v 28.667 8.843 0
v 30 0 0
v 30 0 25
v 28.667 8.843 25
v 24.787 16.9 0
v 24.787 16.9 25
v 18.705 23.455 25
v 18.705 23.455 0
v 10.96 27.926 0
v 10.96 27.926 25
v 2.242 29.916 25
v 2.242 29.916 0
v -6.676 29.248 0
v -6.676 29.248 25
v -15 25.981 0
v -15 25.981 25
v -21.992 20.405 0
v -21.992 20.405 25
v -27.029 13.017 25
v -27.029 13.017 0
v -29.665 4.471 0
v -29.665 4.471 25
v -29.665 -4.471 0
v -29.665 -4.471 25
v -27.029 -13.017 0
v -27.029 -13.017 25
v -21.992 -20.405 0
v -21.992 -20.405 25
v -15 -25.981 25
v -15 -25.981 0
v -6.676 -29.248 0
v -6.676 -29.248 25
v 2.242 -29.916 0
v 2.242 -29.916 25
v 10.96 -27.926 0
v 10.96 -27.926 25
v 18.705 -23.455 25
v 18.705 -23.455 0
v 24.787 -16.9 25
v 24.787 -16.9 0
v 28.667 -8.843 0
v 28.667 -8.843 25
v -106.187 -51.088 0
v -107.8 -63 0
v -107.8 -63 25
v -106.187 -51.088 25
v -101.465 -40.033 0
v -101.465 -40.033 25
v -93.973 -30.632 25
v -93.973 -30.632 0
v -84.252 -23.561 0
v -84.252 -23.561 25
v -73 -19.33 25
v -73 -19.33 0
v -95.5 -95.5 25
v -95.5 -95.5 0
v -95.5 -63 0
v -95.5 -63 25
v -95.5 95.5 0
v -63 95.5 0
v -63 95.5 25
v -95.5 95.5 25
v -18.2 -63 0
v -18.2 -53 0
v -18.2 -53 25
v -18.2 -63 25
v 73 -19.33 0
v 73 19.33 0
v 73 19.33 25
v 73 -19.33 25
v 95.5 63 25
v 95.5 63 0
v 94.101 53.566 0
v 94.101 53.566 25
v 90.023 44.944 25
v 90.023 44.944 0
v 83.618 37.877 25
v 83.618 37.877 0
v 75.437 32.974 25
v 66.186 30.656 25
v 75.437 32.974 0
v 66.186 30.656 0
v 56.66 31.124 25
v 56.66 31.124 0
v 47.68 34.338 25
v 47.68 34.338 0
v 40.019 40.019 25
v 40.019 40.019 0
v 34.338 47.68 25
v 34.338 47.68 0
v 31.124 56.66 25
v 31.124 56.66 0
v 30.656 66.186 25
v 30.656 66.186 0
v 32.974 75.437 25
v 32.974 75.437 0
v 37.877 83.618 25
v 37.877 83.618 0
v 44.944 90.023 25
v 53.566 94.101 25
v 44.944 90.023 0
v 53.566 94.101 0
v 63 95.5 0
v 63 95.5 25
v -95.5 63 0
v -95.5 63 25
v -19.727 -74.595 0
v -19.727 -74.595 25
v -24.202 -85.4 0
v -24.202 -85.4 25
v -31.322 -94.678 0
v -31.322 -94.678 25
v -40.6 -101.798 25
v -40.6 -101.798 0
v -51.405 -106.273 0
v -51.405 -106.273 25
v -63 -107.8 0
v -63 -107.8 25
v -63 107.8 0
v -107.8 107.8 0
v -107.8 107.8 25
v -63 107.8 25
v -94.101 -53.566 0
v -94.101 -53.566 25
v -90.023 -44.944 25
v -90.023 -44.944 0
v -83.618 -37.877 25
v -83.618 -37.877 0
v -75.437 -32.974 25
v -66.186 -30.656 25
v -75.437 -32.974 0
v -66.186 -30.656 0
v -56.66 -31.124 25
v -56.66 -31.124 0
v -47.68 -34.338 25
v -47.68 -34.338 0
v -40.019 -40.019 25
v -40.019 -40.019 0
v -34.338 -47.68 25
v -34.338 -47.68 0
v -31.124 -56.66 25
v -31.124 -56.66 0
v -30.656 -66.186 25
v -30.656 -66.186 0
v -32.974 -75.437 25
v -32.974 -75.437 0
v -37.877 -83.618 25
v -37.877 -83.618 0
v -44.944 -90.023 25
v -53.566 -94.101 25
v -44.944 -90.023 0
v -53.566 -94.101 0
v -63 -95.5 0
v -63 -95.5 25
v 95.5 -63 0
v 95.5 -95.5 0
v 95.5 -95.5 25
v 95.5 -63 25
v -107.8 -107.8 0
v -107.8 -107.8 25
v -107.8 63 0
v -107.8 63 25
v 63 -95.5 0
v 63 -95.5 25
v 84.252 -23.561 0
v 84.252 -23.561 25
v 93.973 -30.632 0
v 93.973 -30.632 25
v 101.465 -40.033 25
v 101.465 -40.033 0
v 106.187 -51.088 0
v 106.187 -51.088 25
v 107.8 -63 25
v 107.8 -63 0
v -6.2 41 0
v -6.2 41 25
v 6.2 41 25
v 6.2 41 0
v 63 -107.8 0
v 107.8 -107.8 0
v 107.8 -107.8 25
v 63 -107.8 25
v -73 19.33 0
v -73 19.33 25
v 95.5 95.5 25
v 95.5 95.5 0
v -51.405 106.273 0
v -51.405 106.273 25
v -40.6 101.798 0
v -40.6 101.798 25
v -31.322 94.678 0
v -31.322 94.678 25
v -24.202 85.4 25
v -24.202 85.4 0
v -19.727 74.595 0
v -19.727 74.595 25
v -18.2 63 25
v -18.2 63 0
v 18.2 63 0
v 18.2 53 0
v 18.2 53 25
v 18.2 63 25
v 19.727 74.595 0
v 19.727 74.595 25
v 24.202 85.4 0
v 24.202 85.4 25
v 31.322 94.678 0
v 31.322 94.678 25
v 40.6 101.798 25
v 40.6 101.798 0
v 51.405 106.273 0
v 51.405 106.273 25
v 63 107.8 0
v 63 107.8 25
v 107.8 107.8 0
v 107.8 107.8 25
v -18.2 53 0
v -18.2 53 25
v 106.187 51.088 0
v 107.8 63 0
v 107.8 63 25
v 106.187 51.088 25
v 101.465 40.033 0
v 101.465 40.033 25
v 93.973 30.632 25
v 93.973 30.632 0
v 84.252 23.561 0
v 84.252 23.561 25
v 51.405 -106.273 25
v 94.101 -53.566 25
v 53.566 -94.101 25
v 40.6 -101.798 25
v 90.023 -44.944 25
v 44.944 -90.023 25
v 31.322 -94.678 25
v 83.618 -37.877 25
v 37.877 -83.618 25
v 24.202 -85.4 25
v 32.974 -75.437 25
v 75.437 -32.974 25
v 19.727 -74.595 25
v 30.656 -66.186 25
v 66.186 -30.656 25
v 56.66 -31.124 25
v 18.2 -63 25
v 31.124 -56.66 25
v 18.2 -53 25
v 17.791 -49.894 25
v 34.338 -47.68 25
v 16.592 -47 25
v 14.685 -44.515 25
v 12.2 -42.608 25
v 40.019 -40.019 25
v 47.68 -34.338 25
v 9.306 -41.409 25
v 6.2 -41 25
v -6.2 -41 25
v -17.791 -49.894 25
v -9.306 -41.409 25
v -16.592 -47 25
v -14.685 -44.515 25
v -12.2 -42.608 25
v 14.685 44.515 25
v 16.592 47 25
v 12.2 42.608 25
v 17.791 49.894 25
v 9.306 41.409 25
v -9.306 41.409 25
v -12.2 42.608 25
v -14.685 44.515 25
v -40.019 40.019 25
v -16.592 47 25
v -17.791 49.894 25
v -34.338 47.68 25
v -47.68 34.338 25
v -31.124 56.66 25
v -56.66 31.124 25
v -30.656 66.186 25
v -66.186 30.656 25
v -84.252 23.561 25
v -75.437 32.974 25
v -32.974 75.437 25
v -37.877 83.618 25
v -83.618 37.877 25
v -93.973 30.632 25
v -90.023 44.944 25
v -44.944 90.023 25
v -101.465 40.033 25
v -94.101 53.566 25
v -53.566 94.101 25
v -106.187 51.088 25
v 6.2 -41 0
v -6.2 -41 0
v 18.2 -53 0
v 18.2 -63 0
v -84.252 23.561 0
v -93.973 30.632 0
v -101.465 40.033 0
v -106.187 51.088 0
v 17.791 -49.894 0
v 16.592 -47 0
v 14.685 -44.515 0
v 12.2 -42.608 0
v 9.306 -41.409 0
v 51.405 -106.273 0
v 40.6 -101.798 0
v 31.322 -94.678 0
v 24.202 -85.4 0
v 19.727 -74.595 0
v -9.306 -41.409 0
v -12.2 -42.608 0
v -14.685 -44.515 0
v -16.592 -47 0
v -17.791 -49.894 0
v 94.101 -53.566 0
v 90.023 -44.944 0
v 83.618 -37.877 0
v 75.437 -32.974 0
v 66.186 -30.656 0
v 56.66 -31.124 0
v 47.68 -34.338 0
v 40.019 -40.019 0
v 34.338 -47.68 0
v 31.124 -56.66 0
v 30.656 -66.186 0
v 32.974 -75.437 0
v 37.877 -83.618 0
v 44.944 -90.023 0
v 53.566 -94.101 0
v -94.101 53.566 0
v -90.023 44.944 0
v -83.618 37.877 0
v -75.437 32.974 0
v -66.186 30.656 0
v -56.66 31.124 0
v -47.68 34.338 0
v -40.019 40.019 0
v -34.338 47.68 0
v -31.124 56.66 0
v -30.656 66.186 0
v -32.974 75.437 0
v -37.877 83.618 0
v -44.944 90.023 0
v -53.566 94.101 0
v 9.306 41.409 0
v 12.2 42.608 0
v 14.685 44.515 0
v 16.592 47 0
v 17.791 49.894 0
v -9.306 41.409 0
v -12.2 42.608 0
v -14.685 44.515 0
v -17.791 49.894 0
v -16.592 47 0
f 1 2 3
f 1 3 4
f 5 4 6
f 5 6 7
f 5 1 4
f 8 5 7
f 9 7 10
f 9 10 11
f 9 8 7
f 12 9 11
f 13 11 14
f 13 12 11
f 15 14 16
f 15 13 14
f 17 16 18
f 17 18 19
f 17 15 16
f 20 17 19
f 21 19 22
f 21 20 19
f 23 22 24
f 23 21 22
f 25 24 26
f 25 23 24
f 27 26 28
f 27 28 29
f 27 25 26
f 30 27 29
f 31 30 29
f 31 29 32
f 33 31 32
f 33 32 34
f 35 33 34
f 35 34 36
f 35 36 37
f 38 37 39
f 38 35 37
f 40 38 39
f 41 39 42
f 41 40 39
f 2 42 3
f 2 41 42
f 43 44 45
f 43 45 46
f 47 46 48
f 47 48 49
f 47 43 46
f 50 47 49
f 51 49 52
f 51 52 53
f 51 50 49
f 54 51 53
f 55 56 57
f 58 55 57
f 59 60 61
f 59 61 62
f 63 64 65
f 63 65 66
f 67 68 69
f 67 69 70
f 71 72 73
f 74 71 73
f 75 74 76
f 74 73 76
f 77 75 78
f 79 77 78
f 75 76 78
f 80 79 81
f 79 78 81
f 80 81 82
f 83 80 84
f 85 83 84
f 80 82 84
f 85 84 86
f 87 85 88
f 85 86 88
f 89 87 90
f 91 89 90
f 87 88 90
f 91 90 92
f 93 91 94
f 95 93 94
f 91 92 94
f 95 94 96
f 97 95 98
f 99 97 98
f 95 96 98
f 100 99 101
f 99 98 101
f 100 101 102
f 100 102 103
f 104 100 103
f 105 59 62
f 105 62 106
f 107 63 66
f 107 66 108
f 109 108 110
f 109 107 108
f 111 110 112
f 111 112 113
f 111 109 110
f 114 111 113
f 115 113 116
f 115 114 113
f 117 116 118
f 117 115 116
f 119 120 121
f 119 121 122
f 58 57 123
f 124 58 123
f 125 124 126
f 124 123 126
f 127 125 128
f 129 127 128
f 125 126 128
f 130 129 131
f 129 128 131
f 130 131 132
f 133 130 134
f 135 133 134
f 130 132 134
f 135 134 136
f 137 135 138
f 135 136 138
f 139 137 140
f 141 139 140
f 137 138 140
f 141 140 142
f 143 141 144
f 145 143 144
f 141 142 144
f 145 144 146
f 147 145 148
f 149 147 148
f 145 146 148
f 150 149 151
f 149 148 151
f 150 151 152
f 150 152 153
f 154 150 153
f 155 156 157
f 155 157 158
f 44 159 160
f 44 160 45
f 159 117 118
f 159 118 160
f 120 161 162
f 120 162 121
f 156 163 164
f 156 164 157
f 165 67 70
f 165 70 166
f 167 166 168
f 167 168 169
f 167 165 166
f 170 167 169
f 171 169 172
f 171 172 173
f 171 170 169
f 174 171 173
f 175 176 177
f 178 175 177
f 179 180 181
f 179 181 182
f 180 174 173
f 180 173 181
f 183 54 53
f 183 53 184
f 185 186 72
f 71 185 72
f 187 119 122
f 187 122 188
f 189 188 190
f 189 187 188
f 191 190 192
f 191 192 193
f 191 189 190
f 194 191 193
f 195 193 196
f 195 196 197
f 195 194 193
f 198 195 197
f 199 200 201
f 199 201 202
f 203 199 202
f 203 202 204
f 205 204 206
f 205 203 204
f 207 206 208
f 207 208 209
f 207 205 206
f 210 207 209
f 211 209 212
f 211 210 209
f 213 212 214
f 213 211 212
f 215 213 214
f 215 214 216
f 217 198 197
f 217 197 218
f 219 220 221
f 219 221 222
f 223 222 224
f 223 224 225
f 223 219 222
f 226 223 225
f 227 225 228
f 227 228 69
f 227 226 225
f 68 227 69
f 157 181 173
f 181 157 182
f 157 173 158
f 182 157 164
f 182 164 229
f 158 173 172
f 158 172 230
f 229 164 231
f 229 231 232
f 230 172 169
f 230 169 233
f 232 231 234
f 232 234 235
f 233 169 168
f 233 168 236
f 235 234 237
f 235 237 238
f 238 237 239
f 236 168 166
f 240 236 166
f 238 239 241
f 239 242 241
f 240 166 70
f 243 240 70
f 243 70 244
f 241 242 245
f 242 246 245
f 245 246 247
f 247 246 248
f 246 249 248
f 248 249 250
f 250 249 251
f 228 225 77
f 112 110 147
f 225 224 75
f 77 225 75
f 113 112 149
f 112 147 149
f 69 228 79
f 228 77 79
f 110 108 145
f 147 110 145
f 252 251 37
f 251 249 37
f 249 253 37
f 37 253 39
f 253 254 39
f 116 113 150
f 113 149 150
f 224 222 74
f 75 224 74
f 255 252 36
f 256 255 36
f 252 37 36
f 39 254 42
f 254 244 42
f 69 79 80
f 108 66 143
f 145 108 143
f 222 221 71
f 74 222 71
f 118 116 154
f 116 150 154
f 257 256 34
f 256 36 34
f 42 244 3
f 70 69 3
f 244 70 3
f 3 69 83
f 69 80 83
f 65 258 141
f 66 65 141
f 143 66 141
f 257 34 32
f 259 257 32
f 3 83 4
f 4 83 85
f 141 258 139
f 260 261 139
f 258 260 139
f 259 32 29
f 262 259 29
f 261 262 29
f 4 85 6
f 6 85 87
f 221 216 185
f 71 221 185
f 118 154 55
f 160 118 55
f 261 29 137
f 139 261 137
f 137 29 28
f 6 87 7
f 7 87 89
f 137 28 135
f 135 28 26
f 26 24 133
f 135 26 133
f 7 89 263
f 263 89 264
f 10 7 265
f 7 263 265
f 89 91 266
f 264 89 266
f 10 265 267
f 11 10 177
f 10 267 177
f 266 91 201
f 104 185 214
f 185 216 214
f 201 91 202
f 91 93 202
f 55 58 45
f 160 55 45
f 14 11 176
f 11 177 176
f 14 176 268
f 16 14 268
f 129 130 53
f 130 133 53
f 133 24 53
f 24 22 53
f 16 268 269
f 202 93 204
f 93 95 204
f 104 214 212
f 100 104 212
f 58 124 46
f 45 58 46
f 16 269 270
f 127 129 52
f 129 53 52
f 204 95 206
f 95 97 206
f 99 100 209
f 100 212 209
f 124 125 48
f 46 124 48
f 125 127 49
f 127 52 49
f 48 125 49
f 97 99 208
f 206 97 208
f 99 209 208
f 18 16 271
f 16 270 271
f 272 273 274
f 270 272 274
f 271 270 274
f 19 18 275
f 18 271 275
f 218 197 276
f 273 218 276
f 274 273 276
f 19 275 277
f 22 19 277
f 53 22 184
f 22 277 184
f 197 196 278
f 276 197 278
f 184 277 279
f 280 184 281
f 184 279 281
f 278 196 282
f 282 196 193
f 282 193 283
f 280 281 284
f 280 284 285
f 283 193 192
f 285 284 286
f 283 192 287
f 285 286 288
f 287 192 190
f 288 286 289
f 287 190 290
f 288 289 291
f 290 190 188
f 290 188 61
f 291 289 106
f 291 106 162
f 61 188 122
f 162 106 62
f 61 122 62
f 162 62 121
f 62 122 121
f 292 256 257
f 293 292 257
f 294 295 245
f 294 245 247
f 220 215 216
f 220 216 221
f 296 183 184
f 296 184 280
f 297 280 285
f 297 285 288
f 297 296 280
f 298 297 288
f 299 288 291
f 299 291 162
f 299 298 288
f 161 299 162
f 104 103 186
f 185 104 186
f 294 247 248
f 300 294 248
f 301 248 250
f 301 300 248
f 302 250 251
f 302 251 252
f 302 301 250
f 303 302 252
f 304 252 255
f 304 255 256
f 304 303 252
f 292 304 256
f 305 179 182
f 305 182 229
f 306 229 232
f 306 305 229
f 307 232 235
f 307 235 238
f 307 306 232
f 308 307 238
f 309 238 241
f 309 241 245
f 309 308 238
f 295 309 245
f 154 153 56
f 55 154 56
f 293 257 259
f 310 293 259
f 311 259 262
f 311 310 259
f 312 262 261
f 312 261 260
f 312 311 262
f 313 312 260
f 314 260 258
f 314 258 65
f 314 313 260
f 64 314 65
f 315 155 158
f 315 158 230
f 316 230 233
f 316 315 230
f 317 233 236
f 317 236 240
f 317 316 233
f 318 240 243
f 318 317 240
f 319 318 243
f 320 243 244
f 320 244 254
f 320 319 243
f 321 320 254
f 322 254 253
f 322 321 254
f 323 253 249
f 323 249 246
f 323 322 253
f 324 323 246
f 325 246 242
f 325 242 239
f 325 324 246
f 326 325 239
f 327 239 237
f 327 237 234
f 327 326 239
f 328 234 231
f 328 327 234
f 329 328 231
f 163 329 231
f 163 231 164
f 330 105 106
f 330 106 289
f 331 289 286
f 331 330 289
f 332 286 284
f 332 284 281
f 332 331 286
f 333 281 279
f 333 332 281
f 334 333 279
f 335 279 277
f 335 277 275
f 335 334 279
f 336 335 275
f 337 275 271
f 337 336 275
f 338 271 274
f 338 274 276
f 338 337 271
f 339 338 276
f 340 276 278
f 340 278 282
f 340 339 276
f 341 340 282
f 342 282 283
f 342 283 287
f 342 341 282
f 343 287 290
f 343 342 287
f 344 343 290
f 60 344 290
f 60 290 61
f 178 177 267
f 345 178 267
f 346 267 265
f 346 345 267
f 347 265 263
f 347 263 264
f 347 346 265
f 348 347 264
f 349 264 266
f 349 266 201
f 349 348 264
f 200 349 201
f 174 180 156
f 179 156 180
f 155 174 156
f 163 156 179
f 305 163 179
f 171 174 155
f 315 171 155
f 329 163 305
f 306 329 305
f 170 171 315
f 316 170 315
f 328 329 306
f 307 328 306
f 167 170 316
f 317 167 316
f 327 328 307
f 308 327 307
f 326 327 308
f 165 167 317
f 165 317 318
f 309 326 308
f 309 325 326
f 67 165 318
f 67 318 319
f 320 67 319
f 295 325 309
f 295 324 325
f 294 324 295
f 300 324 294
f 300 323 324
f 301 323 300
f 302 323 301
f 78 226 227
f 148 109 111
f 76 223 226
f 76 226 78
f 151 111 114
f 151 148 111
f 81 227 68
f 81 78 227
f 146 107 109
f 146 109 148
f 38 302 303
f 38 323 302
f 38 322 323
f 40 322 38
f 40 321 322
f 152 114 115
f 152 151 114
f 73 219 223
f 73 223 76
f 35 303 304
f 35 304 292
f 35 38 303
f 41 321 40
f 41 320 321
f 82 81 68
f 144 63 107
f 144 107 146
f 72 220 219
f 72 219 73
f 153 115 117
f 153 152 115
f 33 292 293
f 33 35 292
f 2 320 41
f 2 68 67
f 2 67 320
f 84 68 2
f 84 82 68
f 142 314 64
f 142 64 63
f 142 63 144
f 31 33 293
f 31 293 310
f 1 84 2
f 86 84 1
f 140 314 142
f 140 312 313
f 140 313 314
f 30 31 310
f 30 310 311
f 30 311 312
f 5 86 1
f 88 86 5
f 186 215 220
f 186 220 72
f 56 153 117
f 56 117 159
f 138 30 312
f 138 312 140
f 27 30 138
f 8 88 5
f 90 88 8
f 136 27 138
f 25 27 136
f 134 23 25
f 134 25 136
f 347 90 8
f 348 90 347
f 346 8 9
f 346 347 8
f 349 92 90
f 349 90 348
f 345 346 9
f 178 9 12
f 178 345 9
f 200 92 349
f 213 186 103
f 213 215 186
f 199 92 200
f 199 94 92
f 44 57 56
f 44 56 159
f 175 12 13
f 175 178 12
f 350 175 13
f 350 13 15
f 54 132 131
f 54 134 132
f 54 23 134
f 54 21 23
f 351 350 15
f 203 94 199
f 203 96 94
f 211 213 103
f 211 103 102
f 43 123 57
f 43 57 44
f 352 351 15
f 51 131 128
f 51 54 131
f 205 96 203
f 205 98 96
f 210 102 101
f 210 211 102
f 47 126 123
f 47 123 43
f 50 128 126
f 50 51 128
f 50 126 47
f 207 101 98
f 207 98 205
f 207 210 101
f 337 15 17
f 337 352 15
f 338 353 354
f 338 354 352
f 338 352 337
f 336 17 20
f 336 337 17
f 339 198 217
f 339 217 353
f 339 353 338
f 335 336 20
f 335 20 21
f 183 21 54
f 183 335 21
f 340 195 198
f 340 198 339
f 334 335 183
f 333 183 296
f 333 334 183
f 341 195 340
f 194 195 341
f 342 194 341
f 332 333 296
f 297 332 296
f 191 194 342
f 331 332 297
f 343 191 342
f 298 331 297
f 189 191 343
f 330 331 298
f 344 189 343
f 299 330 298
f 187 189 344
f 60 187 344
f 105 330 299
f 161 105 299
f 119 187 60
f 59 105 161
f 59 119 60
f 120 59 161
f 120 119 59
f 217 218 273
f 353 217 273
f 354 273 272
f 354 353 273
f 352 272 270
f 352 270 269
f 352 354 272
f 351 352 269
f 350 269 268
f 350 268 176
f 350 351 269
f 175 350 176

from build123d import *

# Parameters (mm, degrees)
SKETCH2_R           = 30
BOSS_EXTRUDE1_DEPTH = 25


with BuildPart() as part:
    # Sketch2 → Boss-Extrude1 (new body)
    with BuildSketch(Plane.XY):
        with BuildLine():
            Line((63, 107.8), (107.8, 107.8))
            Line((107.8, 107.8), (107.8, 63))
            ThreePointArc((107.8, 63), (98.035981505, 35.080114613), (73, 19.330330892))
            Line((73, 19.330330892), (73, -19.330330892))
            ThreePointArc((73, -19.330330892), (98.035981505, -35.080114613), (107.8, -63))
            Line((107.8, -63), (107.8, -107.8))
            Line((107.8, -107.8), (63, -107.8))
            ThreePointArc((63, -107.8), (31.321616203, -94.678383797), (18.2, -63))
            Line((18.2, -63), (18.2, -53))
            ThreePointArc((18.2, -53), (14.685281374, -44.514718626), (6.2, -41))
            Line((6.2, -41), (-6.2, -41))
            ThreePointArc((-6.2, -41), (-14.685281374, -44.514718626), (-18.2, -53))
            Line((-18.2, -53), (-18.2, -63))
            ThreePointArc((-18.2, -63), (-31.321616203, -94.678383797), (-63, -107.8))
            Line((-63, -107.8), (-107.8, -107.8))
            Line((-107.8, -107.8), (-107.8, -63))
            ThreePointArc((-107.8, -63), (-98.035981505, -35.080114613), (-73, -19.330330892))
            Line((-73, -19.330330892), (-73, 19.330330892))
            ThreePointArc((-73, 19.330330892), (-98.035981505, 35.080114613), (-107.8, 63))
            Line((-107.8, 63), (-107.8, 107.8))
            Line((-107.8, 107.8), (-63, 107.8))
            ThreePointArc((-63, 107.8), (-31.321616203, 94.678383797), (-18.2, 63))
            Line((-18.2, 63), (-18.2, 53))
            ThreePointArc((-18.2, 53), (-14.685281374, 44.514718626), (-6.2, 41))
            Line((-6.2, 41), (6.2, 41))
            ThreePointArc((6.2, 41), (14.685281374, 44.514718626), (18.2, 53))
            Line((18.2, 53), (18.2, 63))
            ThreePointArc((18.2, 63), (31.321616203, 94.678383797), (63, 107.8))
        make_face()
        Circle(SKETCH2_R, mode=Mode.SUBTRACT)
        with BuildLine():
            Line((63, 95.5), (95.5, 95.5))
            Line((95.5, 95.5), (95.5, 63))
            ThreePointArc((95.5, 63), (40.019029611, 40.019029611), (63, 95.5))
        make_face(mode=Mode.SUBTRACT)
        with BuildLine():
            Line((95.5, -95.5), (95.5, -63))
            ThreePointArc((95.5, -63), (40.019029611, -40.019029611), (63, -95.5))
            Line((63, -95.5), (95.5, -95.5))
        make_face(mode=Mode.SUBTRACT)
        with BuildLine():
            Line((-63, -95.5), (-95.5, -95.5))
            Line((-95.5, -95.5), (-95.5, -63))
            ThreePointArc((-95.5, -63), (-40.019029611, -40.019029611), (-63, -95.5))
        make_face(mode=Mode.SUBTRACT)
        with BuildLine():
            Line((-95.5, 95.5), (-95.5, 63))
            ThreePointArc((-95.5, 63), (-40.019029611, 40.019029611), (-63, 95.5))
            Line((-63, 95.5), (-95.5, 95.5))
        make_face(mode=Mode.SUBTRACT)
    extrude(amount=BOSS_EXTRUDE1_DEPTH)


solid = part.part
